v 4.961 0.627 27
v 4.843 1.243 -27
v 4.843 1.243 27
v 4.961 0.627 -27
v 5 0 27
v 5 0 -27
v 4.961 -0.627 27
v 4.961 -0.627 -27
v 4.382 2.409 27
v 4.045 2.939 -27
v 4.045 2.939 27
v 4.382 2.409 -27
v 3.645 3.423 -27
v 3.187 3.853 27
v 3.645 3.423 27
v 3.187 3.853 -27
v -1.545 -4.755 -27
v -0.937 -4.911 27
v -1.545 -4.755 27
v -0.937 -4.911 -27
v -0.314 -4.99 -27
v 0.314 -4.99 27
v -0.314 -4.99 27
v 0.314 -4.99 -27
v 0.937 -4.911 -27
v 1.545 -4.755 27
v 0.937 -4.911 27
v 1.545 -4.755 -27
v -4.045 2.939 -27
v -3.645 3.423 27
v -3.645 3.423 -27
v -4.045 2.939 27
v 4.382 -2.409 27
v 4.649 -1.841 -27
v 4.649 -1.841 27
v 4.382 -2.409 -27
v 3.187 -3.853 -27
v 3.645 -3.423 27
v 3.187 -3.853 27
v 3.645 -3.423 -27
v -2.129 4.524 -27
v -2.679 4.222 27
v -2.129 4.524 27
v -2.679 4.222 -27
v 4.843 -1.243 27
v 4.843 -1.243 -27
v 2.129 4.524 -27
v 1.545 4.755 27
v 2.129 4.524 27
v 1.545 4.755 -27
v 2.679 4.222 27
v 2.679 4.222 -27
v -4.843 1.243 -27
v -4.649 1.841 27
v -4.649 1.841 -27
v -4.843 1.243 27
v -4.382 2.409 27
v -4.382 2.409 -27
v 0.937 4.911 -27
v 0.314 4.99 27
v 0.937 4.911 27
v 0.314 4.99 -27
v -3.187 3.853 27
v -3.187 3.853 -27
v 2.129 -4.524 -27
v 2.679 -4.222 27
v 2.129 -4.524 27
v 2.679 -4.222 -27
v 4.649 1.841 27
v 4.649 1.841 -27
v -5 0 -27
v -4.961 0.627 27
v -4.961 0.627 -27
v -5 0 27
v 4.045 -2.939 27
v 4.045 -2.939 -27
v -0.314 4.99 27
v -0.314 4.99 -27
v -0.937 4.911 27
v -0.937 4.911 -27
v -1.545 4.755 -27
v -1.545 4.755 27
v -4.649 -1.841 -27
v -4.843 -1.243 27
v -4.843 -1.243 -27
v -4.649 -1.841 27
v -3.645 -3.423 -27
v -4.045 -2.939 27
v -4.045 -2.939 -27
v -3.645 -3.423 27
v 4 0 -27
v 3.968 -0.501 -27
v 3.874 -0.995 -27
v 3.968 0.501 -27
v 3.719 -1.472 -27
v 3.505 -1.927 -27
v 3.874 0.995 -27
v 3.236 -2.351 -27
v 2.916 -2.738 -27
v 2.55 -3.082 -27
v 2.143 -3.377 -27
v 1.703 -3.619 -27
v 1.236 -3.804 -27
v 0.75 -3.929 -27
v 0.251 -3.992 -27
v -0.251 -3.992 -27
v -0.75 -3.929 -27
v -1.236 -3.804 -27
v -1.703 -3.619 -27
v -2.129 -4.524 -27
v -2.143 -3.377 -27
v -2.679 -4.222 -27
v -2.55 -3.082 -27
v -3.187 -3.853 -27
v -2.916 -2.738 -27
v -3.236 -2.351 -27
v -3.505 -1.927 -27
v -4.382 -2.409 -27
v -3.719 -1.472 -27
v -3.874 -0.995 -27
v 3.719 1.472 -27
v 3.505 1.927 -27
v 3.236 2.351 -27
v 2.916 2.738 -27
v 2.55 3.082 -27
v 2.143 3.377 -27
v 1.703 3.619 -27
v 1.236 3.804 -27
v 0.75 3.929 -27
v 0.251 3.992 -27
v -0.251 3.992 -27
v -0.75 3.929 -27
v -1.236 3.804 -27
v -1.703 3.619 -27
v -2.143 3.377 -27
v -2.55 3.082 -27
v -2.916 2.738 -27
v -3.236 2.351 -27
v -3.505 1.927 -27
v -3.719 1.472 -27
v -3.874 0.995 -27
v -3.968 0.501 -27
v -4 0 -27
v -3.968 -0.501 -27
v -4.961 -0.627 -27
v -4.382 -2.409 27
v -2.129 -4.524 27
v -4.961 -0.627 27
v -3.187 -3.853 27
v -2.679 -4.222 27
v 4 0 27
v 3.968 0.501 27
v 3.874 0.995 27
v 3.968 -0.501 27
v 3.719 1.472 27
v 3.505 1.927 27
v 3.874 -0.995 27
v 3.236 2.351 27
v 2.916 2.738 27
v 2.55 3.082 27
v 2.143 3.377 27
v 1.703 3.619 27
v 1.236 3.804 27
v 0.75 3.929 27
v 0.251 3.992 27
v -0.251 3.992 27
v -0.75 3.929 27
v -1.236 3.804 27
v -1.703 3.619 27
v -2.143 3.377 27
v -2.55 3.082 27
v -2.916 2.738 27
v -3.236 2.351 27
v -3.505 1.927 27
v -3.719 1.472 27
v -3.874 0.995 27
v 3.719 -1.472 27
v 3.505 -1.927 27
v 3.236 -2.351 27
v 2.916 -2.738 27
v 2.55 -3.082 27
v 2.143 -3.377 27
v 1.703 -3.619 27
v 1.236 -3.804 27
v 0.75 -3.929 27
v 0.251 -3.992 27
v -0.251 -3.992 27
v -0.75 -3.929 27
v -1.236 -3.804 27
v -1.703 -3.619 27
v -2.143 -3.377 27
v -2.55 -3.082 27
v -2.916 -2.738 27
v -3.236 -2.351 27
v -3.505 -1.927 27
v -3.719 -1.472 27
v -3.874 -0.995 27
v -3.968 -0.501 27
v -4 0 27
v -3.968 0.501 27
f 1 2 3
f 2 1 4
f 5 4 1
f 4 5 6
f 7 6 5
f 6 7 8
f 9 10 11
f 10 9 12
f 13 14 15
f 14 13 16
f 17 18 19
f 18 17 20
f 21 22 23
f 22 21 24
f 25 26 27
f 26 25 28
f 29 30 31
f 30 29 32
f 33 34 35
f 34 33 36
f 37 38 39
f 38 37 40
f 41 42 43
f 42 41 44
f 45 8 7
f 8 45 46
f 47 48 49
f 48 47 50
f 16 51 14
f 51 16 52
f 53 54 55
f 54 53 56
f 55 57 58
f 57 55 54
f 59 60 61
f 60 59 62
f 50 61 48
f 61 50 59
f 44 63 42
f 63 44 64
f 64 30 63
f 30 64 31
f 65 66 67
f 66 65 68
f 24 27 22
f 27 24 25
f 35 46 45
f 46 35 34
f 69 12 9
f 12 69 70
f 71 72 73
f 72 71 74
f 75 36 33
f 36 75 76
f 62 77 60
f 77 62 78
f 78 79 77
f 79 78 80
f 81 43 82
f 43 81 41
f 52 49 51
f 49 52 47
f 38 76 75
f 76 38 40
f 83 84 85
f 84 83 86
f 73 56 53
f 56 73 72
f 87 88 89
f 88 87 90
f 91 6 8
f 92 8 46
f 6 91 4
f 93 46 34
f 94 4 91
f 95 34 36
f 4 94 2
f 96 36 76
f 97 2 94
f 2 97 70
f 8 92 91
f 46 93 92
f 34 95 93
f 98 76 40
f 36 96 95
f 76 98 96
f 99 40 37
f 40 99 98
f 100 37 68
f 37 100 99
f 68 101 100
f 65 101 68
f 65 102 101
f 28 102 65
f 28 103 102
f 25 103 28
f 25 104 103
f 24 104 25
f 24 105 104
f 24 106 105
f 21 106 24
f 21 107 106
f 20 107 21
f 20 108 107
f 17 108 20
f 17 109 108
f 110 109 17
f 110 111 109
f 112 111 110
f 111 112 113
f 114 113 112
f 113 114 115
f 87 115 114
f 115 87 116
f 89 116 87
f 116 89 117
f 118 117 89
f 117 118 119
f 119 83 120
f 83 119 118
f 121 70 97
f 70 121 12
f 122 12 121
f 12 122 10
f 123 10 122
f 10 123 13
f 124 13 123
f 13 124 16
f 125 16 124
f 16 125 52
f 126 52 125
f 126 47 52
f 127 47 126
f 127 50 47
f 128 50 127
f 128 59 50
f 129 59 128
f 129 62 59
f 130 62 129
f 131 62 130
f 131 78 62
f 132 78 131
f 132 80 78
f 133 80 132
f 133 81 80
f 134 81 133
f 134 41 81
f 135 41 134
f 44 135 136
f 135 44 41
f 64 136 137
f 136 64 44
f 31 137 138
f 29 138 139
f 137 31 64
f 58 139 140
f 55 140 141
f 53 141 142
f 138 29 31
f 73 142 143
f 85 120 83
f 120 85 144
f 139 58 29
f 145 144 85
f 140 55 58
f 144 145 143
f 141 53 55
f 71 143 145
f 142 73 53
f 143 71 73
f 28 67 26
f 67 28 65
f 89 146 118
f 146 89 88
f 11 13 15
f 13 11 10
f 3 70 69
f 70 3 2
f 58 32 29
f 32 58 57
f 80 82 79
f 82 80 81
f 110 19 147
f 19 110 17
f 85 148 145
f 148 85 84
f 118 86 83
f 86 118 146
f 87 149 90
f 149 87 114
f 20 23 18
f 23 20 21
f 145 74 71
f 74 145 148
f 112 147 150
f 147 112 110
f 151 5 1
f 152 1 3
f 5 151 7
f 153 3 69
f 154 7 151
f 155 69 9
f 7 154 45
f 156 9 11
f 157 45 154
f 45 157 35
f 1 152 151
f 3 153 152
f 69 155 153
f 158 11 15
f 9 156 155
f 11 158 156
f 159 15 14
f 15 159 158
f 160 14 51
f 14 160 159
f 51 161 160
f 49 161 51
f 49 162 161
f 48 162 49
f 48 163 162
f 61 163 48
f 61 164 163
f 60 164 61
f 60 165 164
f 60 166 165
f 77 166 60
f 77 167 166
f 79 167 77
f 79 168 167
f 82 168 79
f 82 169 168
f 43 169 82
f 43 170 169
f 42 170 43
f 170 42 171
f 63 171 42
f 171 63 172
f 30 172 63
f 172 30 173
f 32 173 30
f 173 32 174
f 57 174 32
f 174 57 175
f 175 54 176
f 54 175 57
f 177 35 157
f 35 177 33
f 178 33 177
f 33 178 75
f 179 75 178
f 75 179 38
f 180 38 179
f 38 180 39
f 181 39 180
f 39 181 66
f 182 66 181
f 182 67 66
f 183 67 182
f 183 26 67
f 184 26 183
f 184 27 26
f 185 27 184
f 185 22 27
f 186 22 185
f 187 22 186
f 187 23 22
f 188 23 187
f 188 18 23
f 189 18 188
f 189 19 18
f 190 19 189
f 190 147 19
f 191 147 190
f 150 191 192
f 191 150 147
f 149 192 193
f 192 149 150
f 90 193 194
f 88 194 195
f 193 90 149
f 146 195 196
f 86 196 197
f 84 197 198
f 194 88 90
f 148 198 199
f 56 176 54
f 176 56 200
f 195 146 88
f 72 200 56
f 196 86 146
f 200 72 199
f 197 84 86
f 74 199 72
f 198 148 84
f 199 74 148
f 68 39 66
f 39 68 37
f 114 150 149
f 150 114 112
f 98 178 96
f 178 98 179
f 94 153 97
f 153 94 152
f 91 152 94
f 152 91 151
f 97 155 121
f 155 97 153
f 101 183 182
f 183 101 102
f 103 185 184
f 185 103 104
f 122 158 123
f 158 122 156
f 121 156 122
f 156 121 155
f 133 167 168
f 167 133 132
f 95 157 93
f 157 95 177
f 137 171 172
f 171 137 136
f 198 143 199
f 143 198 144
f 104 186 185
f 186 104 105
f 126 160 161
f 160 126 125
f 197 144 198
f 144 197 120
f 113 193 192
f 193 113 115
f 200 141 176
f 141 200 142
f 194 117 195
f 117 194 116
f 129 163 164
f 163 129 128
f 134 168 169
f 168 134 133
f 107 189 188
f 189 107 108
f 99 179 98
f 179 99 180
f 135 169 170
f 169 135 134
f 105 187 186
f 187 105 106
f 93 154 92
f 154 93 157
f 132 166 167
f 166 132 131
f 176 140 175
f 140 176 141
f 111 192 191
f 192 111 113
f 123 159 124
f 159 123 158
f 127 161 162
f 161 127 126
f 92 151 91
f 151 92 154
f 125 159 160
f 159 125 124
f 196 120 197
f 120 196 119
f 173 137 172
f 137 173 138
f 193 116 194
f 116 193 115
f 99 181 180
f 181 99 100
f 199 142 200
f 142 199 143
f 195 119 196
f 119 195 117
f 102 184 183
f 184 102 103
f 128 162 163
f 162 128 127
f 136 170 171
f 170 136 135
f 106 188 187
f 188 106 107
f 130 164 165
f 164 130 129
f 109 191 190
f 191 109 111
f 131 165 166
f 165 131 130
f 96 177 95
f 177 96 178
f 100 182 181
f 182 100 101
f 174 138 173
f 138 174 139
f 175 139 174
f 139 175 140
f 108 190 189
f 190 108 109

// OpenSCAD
$fn = 50;


difference() {
	union() {
		translate(v = [0, 0, -27.0000000000]) {
			cylinder(h = 54, r = 5.0000000000);
		}
	}
	union() {
		translate(v = [0, 0, -100.0000000000]) {
			cylinder(h = 200, r = 4.0000000000);
		}
	}
}
